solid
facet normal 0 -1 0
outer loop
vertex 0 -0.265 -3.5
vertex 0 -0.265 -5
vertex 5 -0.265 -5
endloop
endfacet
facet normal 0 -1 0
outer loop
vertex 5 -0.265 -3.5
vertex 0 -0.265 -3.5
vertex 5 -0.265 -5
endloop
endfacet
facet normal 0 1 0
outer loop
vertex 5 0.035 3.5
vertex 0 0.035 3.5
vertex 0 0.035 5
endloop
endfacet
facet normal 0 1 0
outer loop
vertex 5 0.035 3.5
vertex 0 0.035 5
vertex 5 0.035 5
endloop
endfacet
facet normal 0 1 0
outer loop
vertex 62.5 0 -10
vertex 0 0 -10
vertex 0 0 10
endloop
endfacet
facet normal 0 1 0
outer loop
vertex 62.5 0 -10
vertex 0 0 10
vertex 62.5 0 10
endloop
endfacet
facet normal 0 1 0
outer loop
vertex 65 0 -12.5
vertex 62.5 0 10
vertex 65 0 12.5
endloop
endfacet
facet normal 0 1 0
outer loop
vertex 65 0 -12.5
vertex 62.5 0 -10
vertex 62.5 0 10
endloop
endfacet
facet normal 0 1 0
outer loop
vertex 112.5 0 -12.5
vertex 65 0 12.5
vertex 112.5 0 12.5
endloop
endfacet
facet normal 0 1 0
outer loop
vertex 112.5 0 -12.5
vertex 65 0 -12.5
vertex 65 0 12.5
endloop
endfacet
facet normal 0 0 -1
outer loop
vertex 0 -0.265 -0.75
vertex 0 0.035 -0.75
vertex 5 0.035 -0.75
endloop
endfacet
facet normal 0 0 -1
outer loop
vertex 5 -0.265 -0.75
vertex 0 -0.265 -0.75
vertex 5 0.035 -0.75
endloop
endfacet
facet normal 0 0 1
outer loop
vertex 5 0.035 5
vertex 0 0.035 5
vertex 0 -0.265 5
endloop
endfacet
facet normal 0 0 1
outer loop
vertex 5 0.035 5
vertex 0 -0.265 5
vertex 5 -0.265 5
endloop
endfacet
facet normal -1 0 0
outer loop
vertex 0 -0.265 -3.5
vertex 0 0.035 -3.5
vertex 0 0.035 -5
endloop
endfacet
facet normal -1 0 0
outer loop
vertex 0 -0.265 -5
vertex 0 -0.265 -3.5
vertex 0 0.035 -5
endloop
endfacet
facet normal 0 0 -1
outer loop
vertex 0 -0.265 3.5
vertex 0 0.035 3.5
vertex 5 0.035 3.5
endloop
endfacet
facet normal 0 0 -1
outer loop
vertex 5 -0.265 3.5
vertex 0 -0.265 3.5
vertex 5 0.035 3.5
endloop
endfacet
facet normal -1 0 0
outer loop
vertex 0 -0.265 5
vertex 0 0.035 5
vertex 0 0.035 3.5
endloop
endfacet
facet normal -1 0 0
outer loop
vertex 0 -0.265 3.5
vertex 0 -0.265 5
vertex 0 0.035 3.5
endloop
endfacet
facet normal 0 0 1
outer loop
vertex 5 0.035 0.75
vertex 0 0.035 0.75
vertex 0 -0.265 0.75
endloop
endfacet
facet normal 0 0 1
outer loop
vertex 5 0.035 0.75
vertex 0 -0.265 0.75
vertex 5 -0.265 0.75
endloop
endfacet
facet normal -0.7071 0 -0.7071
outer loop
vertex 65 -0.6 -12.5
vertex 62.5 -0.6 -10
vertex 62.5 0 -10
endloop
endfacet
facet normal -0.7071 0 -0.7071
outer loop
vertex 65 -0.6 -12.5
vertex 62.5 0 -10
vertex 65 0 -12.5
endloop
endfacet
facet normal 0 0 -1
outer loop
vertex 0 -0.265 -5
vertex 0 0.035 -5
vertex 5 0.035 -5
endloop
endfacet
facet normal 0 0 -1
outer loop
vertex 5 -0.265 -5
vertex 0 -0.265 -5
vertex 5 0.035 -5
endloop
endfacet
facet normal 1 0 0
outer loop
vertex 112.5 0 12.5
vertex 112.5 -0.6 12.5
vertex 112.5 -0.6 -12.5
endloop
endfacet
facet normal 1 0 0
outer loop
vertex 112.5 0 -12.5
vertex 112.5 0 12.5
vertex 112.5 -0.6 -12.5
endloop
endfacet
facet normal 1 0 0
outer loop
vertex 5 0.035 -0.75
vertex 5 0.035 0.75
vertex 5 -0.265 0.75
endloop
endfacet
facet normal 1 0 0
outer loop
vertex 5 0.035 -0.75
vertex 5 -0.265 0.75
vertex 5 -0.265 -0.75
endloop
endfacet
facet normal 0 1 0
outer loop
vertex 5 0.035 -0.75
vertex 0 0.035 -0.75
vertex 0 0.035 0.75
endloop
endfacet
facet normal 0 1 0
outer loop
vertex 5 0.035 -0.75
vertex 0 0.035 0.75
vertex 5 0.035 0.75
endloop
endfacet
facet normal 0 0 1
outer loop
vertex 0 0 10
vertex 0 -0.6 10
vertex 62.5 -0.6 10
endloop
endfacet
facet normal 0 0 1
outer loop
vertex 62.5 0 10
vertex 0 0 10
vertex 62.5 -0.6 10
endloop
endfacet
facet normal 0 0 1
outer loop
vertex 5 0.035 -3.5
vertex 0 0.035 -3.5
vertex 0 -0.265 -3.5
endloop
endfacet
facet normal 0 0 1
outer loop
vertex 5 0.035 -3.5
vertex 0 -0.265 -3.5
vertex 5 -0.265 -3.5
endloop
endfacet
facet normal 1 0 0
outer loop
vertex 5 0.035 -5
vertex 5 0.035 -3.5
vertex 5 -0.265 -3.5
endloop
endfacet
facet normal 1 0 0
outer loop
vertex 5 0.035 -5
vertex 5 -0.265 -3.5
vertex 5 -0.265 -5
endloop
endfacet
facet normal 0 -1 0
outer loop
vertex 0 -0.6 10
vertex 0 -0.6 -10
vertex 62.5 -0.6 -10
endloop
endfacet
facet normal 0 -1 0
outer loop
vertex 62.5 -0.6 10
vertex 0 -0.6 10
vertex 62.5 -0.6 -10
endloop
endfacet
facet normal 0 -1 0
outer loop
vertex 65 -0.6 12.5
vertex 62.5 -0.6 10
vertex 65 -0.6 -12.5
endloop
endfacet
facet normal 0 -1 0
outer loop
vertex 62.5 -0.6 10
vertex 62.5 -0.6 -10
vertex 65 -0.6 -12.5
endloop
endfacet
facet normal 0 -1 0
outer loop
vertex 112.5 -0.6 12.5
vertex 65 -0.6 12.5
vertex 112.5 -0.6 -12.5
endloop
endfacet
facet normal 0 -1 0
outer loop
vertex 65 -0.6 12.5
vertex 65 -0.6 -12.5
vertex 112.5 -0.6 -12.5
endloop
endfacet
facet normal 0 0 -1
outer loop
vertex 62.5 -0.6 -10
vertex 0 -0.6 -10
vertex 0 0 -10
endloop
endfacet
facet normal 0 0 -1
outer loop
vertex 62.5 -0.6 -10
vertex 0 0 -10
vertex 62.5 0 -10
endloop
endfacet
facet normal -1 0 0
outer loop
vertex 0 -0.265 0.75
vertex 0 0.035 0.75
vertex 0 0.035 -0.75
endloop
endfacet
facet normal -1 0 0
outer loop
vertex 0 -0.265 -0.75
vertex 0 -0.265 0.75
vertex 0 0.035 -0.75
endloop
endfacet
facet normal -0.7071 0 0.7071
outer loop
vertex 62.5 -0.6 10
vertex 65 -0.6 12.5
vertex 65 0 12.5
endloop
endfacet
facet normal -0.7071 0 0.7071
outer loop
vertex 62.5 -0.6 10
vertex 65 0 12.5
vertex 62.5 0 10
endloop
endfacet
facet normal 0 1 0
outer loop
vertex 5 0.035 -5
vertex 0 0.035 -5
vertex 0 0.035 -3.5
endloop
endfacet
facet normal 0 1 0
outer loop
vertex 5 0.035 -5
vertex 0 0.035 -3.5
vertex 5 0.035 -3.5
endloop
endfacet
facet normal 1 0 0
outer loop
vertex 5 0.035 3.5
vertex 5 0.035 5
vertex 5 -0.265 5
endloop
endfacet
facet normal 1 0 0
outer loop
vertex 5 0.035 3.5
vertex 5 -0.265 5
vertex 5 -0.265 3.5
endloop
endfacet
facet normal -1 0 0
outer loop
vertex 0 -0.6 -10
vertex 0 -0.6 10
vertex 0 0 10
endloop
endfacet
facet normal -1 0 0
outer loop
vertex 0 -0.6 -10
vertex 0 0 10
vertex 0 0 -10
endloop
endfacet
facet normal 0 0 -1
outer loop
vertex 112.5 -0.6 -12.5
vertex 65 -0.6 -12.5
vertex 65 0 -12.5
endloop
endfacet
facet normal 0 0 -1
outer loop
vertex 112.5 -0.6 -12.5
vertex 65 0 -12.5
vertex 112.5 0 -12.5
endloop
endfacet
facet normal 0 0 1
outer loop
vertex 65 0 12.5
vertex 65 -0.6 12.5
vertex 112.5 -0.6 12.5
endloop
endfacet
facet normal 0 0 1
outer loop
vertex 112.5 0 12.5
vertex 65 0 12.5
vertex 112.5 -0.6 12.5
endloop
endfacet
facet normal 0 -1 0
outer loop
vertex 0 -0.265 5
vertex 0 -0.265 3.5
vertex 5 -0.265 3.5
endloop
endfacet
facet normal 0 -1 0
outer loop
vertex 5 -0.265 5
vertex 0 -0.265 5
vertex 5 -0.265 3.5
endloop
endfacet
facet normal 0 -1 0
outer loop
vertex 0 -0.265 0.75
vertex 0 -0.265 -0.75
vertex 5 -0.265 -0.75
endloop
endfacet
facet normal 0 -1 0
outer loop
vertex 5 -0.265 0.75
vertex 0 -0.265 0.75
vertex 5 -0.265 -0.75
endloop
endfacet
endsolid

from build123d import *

# Parameters (mm, degrees)
BOSS_EXTRUDE1_START   = -0.6
SKETCH1_W             = 62.5
SKETCH1_H             = 20
SKETCH1_W_2           = 47.5
SKETCH1_H_2           = 25
BOSS_EXTRUDE1_DEPTH   = 0.6
BOSS_EXTRUDE2_START   = 0.035
SKETCH2_W             = 5
SKETCH2_H             = 1.5
BOSS_EXTRUDE2_DEPTH   = 0.3
BOSS_EXTRUDE2_2_DEPTH = 0.3
BOSS_EXTRUDE2_3_DEPTH = 0.3


with BuildPart() as part:
    # Sketch1 → Boss-Extrude1 (new body)
    with BuildSketch(Plane(origin=(0, 0, 0), x_dir=(1, 0, 0), z_dir=(0, 1, 0)).offset(BOSS_EXTRUDE1_START)):
        with Locations((31.25, 0)):
            Rectangle(SKETCH1_W, SKETCH1_H)
        Polygon((65, 12.5), (65, -12.5), (62.5, -10), (62.5, 10), align=None)
        with Locations((88.75, 0)):
            Rectangle(SKETCH1_W_2, SKETCH1_H_2)
    extrude(amount=BOSS_EXTRUDE1_DEPTH)


with BuildPart() as body_2:
    # Sketch2 → Boss-Extrude2 (new body)
    with BuildSketch(Plane(origin=(0, 0, 0), x_dir=(1, 0, 0), z_dir=(0, 1, 0)).offset(BOSS_EXTRUDE2_START)):
        with Locations((2.5, 0)):
            Rectangle(SKETCH2_W, SKETCH2_H)
    extrude(amount=-BOSS_EXTRUDE2_DEPTH)


with BuildPart() as body_3:
    # Sketch2 → Boss-Extrude2 2 (new body)
    with BuildSketch(Plane(origin=(0, 0, 0), x_dir=(1, 0, 0), z_dir=(0, 1, 0)).offset(BOSS_EXTRUDE2_START)):
        with Locations((2.5, 4.25)):
            Rectangle(SKETCH2_W, SKETCH2_H)
    extrude(amount=-BOSS_EXTRUDE2_2_DEPTH)


with BuildPart() as body_4:
    # Sketch2 → Boss-Extrude2 3 (new body)
    with BuildSketch(Plane(origin=(0, 0, 0), x_dir=(1, 0, 0), z_dir=(0, 1, 0)).offset(BOSS_EXTRUDE2_START)):
        with Locations((2.5, -4.25)):
            Rectangle(SKETCH2_W, SKETCH2_H)
    extrude(amount=-BOSS_EXTRUDE2_3_DEPTH)


solid = Compound([part.part, body_2.part, body_3.part, body_4.part])
